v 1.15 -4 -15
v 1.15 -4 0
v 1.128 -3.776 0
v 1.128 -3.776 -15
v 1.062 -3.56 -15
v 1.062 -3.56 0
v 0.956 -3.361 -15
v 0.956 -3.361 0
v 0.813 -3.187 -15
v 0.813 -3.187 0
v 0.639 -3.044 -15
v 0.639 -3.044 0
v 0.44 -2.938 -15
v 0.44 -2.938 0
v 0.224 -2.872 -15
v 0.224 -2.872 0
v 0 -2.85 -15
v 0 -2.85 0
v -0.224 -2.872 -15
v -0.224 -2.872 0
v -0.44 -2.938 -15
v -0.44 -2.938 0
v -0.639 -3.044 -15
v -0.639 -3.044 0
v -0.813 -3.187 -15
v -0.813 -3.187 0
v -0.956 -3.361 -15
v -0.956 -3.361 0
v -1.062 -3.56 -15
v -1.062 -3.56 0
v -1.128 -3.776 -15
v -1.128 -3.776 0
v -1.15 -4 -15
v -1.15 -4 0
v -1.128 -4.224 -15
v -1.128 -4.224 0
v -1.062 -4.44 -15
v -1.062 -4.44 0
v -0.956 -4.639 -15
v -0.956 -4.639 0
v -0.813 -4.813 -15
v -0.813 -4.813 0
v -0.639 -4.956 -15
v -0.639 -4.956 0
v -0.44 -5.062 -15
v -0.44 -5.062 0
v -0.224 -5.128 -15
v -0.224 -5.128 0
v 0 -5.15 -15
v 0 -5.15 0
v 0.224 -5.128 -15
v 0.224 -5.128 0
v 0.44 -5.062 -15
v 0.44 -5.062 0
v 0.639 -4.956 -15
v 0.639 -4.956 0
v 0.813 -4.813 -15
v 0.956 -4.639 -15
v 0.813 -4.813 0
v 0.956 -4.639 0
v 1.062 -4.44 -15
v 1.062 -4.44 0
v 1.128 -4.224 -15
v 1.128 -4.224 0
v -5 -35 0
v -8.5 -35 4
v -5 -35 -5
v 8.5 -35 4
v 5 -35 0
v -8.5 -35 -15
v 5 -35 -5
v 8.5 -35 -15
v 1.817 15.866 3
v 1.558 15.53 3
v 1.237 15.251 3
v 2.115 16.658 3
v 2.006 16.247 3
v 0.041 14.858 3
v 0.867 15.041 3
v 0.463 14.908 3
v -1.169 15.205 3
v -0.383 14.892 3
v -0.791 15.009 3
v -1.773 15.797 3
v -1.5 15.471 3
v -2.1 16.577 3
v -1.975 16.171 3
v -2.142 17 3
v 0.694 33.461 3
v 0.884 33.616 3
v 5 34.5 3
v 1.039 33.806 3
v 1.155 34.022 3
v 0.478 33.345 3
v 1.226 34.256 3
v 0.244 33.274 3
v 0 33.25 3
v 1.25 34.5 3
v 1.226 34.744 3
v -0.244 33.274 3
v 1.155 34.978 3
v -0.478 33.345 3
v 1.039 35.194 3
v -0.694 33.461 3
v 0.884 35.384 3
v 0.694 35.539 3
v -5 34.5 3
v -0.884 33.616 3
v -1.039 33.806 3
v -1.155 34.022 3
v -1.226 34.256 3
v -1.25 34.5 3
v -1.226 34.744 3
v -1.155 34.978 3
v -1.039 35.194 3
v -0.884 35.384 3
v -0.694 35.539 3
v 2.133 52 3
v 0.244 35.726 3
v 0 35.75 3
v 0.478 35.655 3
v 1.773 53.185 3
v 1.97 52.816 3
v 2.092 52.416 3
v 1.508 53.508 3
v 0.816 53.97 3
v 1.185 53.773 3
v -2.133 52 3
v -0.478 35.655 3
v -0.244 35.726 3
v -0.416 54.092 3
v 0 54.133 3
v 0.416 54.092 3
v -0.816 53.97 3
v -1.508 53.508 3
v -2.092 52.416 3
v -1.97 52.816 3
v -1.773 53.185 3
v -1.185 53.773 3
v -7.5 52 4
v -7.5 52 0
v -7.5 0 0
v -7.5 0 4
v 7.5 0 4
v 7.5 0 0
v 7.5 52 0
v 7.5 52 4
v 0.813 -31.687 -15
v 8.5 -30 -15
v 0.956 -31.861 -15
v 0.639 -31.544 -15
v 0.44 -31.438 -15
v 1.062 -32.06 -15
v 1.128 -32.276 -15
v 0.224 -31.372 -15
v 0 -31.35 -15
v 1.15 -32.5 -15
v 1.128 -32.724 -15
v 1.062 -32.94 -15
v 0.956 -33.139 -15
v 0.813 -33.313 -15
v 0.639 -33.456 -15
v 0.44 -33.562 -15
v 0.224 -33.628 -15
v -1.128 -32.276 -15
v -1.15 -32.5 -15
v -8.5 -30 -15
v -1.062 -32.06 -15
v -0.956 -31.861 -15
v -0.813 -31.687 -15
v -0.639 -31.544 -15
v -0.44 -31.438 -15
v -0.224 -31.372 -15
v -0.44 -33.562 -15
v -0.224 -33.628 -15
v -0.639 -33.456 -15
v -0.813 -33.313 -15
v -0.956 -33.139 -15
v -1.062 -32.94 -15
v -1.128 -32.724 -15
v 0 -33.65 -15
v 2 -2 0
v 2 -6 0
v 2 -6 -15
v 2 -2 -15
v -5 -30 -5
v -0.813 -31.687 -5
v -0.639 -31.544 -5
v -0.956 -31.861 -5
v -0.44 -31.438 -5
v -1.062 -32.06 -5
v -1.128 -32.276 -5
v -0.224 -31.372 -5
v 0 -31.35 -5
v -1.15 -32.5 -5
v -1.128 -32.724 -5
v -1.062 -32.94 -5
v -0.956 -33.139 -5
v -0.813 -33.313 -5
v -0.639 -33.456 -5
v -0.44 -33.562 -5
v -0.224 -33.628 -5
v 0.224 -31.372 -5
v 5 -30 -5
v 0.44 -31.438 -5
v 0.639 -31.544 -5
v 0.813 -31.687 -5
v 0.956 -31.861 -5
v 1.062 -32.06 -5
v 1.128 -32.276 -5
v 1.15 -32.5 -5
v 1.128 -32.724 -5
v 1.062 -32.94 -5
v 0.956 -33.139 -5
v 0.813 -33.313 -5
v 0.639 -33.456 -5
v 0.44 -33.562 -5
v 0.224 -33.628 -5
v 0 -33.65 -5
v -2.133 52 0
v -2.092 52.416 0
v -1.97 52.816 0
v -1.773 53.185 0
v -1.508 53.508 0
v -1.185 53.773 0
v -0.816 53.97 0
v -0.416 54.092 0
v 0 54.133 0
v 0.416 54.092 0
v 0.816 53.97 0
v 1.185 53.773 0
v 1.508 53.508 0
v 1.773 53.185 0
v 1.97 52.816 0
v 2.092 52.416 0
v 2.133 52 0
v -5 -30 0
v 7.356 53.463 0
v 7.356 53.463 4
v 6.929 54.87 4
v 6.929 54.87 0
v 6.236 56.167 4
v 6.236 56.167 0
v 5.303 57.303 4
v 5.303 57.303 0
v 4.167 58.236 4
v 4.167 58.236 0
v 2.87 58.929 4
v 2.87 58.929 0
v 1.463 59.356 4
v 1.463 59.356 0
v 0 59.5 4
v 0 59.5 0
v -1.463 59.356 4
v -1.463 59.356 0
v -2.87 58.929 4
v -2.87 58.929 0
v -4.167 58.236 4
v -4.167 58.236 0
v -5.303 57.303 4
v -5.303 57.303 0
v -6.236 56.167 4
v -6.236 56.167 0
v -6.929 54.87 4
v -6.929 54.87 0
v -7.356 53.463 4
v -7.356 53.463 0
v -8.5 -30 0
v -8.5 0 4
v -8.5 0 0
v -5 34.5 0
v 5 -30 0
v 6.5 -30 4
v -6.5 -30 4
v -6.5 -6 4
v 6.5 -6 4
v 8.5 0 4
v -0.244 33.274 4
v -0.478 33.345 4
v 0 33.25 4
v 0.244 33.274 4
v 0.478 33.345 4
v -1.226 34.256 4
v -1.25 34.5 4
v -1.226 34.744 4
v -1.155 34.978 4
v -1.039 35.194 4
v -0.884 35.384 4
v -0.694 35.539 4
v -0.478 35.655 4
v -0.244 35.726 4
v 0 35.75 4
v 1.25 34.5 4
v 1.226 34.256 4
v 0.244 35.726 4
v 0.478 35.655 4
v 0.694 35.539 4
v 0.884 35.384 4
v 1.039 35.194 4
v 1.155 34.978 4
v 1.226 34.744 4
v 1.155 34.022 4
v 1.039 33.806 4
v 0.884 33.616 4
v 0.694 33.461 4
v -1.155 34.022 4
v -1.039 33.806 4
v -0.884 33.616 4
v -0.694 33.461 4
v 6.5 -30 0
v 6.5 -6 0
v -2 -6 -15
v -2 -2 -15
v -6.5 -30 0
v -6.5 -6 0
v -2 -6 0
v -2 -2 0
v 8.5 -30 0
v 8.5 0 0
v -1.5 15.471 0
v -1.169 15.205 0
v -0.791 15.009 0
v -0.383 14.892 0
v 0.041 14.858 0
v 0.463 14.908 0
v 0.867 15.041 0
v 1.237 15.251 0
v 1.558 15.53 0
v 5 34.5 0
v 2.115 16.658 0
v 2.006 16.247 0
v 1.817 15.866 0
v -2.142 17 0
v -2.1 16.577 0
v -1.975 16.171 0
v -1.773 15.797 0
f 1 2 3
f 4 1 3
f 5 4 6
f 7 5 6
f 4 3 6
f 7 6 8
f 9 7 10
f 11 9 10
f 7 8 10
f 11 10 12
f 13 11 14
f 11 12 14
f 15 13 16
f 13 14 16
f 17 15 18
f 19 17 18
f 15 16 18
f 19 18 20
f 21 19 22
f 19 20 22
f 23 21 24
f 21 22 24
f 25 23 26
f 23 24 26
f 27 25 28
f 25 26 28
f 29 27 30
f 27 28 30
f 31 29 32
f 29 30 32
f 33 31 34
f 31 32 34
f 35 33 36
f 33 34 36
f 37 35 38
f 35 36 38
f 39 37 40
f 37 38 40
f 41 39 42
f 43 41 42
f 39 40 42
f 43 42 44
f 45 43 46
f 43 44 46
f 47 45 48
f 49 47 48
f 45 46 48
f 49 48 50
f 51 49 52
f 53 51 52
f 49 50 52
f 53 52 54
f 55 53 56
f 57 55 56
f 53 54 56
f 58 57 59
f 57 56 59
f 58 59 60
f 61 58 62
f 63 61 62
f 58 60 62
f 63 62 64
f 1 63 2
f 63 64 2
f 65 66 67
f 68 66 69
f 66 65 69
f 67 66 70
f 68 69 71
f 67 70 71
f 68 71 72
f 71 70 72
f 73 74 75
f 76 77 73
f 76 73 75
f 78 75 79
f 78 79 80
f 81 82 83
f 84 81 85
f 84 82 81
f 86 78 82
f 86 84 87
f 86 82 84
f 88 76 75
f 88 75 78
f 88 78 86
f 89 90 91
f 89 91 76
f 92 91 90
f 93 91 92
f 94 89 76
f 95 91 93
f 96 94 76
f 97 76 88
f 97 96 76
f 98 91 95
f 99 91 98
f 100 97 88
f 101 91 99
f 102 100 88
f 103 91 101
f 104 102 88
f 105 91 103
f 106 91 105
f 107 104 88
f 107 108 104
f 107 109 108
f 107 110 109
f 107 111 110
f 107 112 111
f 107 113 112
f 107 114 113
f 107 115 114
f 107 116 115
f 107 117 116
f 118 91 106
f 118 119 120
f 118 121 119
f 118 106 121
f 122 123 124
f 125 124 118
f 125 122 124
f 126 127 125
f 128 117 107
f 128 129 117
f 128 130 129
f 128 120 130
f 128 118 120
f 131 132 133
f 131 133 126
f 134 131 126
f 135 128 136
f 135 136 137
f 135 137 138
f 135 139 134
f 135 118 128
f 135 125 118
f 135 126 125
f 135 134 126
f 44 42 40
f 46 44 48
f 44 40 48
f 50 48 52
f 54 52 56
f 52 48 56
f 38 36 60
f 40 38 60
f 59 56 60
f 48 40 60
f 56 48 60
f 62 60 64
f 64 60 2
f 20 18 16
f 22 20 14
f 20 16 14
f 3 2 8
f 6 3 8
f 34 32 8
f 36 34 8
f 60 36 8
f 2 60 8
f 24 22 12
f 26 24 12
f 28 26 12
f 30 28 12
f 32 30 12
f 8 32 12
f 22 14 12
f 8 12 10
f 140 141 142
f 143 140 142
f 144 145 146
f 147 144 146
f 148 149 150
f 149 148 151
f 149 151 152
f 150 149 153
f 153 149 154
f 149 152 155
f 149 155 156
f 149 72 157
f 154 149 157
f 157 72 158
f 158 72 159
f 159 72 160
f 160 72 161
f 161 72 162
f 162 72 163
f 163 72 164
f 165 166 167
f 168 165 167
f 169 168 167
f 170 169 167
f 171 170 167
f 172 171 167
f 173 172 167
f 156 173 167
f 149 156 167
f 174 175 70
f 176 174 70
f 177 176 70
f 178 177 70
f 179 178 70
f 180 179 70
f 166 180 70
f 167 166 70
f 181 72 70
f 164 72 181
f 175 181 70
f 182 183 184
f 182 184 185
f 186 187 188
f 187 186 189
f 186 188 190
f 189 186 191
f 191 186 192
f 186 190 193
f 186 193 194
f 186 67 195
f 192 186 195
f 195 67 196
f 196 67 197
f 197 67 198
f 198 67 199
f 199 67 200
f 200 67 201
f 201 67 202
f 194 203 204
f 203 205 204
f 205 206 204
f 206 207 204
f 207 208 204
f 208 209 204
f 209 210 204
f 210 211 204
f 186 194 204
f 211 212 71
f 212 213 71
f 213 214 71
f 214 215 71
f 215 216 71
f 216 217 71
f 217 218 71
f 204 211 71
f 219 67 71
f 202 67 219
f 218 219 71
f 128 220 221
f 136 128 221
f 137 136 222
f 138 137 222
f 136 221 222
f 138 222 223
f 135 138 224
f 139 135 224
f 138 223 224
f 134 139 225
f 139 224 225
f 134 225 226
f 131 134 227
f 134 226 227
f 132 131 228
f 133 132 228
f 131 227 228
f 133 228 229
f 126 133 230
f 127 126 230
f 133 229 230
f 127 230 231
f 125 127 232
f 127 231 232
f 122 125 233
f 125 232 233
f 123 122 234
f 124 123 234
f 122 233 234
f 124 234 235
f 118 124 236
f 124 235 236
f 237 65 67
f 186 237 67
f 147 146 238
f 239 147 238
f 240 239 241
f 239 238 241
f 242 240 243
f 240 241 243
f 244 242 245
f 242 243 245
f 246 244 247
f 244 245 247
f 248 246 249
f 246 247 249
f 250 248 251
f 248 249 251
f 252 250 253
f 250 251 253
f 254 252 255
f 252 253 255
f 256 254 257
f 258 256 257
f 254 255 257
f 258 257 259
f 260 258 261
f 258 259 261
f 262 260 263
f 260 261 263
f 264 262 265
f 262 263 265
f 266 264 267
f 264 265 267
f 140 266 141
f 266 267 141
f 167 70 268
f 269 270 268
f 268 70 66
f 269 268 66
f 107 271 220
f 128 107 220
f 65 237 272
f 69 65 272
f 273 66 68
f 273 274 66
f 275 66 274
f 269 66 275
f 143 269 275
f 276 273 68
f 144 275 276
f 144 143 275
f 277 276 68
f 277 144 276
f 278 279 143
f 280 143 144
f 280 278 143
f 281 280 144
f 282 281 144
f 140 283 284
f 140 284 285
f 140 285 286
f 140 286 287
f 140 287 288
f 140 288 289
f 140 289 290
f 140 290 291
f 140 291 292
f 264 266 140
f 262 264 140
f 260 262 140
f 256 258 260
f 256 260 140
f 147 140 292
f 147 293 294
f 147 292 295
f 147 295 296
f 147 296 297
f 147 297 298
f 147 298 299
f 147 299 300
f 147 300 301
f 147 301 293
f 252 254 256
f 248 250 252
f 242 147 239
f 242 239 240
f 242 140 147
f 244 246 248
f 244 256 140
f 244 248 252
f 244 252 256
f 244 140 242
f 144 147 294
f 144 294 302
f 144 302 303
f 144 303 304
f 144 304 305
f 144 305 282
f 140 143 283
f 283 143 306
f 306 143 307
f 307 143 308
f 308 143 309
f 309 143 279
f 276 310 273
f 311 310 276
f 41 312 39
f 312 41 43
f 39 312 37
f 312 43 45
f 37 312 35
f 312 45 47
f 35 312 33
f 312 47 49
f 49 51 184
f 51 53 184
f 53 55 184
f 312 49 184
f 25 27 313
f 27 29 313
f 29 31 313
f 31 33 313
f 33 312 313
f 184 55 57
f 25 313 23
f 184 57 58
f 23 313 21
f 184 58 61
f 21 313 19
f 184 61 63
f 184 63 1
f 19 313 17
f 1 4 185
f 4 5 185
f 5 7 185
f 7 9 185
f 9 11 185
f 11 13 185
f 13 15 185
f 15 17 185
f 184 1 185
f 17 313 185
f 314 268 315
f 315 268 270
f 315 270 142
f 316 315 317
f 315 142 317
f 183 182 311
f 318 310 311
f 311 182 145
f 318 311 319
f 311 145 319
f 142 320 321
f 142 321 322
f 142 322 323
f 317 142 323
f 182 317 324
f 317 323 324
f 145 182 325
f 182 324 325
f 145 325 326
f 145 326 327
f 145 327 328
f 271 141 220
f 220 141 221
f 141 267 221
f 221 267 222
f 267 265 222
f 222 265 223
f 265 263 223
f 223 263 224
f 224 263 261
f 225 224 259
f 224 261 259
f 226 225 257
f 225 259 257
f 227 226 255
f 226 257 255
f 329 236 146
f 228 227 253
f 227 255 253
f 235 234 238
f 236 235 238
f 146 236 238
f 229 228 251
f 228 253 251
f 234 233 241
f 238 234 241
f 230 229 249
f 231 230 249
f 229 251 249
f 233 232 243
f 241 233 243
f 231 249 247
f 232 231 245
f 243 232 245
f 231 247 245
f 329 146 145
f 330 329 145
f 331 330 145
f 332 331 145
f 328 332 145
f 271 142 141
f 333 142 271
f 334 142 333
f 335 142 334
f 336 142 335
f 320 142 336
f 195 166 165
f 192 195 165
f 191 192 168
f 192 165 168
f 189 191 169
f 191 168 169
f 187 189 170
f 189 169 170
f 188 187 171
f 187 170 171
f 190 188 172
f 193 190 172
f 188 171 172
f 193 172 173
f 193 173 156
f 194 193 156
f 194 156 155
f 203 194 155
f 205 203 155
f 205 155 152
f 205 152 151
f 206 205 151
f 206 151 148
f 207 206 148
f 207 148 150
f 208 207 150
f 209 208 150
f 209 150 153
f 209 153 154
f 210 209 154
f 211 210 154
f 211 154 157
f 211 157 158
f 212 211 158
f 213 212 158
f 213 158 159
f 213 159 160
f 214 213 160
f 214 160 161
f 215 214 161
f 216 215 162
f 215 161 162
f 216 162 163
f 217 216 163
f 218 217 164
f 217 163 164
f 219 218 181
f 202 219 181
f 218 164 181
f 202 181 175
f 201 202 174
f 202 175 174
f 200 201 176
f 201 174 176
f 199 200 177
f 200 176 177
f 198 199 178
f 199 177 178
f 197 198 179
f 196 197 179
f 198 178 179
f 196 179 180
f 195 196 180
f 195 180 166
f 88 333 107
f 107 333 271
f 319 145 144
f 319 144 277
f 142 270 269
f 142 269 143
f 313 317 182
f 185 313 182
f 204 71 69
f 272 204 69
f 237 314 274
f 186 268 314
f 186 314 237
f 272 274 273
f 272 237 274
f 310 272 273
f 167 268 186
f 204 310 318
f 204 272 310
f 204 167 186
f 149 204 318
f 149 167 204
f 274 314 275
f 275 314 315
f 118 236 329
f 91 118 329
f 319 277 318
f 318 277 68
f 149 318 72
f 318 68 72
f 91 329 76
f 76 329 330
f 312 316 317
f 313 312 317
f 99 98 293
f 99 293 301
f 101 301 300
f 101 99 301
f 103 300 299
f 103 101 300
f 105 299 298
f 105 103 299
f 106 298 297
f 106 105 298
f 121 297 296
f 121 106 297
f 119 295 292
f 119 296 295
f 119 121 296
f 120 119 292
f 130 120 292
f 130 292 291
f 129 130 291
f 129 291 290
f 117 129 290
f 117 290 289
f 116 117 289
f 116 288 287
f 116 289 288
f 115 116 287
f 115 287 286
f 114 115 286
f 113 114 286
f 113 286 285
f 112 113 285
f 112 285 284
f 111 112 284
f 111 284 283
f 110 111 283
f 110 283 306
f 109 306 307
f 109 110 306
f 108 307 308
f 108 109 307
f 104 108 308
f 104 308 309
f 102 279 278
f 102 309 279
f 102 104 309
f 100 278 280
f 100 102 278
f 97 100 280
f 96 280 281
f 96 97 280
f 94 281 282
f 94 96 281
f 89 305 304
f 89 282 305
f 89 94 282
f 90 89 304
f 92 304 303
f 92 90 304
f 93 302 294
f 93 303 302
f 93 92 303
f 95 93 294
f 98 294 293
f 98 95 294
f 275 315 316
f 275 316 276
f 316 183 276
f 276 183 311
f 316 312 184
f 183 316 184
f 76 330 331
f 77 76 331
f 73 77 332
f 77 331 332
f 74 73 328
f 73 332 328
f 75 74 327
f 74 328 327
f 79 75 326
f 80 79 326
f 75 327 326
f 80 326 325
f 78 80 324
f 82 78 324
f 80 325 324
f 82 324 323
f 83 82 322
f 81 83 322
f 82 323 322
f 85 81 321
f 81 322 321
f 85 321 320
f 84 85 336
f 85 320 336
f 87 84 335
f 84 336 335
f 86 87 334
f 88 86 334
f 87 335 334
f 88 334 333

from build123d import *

# Parameters (mm, degrees)
EXTRUDE_1_DEPTH     = 4
CUT_EXTRUDE_1_DEPTH = 3
SKETCH_5_R          = 1.25
CUT_EXTRUDE_2_DEPTH = 12.4
SKETCH_6_W          = 17
SKETCH_6_H          = 35
EXTRUDE_2_DEPTH     = 4
SKETCH_7_W          = 13
SKETCH_7_H          = 24
CUT_EXTRUDE_3_DEPTH = 12.1
SKETCH_8_W          = 4
SKETCH_8_H          = 4
SKETCH_8_R          = 1.15
EXTRUDE_3_DEPTH     = 15
EXTRUDE_4_DEPTH     = 5
SKETCH_10_R         = 1.15
CUT_EXTRUDE_4_DEPTH = 12.7


with BuildPart() as part:
    # 草圖1 → 填料-伸長1 (new body)
    with BuildSketch(Plane.XY):
        with BuildLine():
            Line((7.5, 0), (7.5, 52))
            ThreePointArc((7.5, 52), (0, 59.5), (-7.5, 52))
            Line((-7.5, 52), (-7.5, 0))
            Line((-7.5, 0), (7.5, 0))
        make_face()
    extrude(amount=EXTRUDE_1_DEPTH)

    # 草圖3 → 除料-伸長1 (cut)
    with BuildSketch(Plane.XY):
        with BuildLine():
            ThreePointArc((-2.132795501, 52), (0, 54.132795501), (2.132795501, 52))
            Line((2.132795501, 52), (5, 34.5))
            Line((5, 34.5), (2.114741289, 16.658021353))
            ThreePointArc((2.114741289, 16.658021353), (-0.171540182, 14.864665347), (-2.142213835, 17))
            Line((-2.142213835, 17), (-5, 34.5))
            Line((-5, 34.5), (-2.132795501, 52))
        make_face()
    extrude(amount=CUT_EXTRUDE_1_DEPTH, mode=Mode.SUBTRACT)

    # 草圖5 → 除料-伸長2 (cut)
    with BuildSketch(Plane.XY):
        with Locations((0, 34.5)):
            Circle(SKETCH_5_R)
    extrude(amount=CUT_EXTRUDE_2_DEPTH, mode=Mode.SUBTRACT)

    # 草圖6 → 填料-伸長2 (add)
    with BuildSketch(Plane.XY):
        with Locations((0, -17.5)):
            Rectangle(SKETCH_6_W, SKETCH_6_H)
    extrude(amount=EXTRUDE_2_DEPTH)

    # 草圖7 → 除料-伸長3 (cut)
    with BuildSketch(Plane.XY):
        with Locations((0, -18)):
            Rectangle(SKETCH_7_W, SKETCH_7_H)
    extrude(amount=CUT_EXTRUDE_3_DEPTH, mode=Mode.SUBTRACT)

    # 草圖8 → 填料-伸長3 (add)
    with BuildSketch(Plane.XY):
        with Locations((0, -4)):
            Rectangle(SKETCH_8_W, SKETCH_8_H)
        with Locations((0, -4)):
            Circle(SKETCH_8_R, mode=Mode.SUBTRACT)
    extrude(amount=-EXTRUDE_3_DEPTH)

    # 草圖9 → 填料-伸長4 (add)
    with BuildSketch(Plane(origin=(0, -35, 0), x_dir=(1, 0, 0), z_dir=(0, 1, 0))):
        Polygon((-8.5, 0), (-5, 0), (-5, 5), (5, 5), (5, 0), (8.5, 0), (8.5, 15), (-8.5, 15), align=None)
    extrude(amount=EXTRUDE_4_DEPTH)

    # 草圖10 → 除料-伸長4 (cut)
    with BuildSketch(Plane(origin=(0, 0, -15), x_dir=(-1, 0, 0), z_dir=(0, 0, -1))):
        with Locations((0, -32.5)):
            Circle(SKETCH_10_R)
    extrude(amount=-CUT_EXTRUDE_4_DEPTH, mode=Mode.SUBTRACT)


solid = part.part
